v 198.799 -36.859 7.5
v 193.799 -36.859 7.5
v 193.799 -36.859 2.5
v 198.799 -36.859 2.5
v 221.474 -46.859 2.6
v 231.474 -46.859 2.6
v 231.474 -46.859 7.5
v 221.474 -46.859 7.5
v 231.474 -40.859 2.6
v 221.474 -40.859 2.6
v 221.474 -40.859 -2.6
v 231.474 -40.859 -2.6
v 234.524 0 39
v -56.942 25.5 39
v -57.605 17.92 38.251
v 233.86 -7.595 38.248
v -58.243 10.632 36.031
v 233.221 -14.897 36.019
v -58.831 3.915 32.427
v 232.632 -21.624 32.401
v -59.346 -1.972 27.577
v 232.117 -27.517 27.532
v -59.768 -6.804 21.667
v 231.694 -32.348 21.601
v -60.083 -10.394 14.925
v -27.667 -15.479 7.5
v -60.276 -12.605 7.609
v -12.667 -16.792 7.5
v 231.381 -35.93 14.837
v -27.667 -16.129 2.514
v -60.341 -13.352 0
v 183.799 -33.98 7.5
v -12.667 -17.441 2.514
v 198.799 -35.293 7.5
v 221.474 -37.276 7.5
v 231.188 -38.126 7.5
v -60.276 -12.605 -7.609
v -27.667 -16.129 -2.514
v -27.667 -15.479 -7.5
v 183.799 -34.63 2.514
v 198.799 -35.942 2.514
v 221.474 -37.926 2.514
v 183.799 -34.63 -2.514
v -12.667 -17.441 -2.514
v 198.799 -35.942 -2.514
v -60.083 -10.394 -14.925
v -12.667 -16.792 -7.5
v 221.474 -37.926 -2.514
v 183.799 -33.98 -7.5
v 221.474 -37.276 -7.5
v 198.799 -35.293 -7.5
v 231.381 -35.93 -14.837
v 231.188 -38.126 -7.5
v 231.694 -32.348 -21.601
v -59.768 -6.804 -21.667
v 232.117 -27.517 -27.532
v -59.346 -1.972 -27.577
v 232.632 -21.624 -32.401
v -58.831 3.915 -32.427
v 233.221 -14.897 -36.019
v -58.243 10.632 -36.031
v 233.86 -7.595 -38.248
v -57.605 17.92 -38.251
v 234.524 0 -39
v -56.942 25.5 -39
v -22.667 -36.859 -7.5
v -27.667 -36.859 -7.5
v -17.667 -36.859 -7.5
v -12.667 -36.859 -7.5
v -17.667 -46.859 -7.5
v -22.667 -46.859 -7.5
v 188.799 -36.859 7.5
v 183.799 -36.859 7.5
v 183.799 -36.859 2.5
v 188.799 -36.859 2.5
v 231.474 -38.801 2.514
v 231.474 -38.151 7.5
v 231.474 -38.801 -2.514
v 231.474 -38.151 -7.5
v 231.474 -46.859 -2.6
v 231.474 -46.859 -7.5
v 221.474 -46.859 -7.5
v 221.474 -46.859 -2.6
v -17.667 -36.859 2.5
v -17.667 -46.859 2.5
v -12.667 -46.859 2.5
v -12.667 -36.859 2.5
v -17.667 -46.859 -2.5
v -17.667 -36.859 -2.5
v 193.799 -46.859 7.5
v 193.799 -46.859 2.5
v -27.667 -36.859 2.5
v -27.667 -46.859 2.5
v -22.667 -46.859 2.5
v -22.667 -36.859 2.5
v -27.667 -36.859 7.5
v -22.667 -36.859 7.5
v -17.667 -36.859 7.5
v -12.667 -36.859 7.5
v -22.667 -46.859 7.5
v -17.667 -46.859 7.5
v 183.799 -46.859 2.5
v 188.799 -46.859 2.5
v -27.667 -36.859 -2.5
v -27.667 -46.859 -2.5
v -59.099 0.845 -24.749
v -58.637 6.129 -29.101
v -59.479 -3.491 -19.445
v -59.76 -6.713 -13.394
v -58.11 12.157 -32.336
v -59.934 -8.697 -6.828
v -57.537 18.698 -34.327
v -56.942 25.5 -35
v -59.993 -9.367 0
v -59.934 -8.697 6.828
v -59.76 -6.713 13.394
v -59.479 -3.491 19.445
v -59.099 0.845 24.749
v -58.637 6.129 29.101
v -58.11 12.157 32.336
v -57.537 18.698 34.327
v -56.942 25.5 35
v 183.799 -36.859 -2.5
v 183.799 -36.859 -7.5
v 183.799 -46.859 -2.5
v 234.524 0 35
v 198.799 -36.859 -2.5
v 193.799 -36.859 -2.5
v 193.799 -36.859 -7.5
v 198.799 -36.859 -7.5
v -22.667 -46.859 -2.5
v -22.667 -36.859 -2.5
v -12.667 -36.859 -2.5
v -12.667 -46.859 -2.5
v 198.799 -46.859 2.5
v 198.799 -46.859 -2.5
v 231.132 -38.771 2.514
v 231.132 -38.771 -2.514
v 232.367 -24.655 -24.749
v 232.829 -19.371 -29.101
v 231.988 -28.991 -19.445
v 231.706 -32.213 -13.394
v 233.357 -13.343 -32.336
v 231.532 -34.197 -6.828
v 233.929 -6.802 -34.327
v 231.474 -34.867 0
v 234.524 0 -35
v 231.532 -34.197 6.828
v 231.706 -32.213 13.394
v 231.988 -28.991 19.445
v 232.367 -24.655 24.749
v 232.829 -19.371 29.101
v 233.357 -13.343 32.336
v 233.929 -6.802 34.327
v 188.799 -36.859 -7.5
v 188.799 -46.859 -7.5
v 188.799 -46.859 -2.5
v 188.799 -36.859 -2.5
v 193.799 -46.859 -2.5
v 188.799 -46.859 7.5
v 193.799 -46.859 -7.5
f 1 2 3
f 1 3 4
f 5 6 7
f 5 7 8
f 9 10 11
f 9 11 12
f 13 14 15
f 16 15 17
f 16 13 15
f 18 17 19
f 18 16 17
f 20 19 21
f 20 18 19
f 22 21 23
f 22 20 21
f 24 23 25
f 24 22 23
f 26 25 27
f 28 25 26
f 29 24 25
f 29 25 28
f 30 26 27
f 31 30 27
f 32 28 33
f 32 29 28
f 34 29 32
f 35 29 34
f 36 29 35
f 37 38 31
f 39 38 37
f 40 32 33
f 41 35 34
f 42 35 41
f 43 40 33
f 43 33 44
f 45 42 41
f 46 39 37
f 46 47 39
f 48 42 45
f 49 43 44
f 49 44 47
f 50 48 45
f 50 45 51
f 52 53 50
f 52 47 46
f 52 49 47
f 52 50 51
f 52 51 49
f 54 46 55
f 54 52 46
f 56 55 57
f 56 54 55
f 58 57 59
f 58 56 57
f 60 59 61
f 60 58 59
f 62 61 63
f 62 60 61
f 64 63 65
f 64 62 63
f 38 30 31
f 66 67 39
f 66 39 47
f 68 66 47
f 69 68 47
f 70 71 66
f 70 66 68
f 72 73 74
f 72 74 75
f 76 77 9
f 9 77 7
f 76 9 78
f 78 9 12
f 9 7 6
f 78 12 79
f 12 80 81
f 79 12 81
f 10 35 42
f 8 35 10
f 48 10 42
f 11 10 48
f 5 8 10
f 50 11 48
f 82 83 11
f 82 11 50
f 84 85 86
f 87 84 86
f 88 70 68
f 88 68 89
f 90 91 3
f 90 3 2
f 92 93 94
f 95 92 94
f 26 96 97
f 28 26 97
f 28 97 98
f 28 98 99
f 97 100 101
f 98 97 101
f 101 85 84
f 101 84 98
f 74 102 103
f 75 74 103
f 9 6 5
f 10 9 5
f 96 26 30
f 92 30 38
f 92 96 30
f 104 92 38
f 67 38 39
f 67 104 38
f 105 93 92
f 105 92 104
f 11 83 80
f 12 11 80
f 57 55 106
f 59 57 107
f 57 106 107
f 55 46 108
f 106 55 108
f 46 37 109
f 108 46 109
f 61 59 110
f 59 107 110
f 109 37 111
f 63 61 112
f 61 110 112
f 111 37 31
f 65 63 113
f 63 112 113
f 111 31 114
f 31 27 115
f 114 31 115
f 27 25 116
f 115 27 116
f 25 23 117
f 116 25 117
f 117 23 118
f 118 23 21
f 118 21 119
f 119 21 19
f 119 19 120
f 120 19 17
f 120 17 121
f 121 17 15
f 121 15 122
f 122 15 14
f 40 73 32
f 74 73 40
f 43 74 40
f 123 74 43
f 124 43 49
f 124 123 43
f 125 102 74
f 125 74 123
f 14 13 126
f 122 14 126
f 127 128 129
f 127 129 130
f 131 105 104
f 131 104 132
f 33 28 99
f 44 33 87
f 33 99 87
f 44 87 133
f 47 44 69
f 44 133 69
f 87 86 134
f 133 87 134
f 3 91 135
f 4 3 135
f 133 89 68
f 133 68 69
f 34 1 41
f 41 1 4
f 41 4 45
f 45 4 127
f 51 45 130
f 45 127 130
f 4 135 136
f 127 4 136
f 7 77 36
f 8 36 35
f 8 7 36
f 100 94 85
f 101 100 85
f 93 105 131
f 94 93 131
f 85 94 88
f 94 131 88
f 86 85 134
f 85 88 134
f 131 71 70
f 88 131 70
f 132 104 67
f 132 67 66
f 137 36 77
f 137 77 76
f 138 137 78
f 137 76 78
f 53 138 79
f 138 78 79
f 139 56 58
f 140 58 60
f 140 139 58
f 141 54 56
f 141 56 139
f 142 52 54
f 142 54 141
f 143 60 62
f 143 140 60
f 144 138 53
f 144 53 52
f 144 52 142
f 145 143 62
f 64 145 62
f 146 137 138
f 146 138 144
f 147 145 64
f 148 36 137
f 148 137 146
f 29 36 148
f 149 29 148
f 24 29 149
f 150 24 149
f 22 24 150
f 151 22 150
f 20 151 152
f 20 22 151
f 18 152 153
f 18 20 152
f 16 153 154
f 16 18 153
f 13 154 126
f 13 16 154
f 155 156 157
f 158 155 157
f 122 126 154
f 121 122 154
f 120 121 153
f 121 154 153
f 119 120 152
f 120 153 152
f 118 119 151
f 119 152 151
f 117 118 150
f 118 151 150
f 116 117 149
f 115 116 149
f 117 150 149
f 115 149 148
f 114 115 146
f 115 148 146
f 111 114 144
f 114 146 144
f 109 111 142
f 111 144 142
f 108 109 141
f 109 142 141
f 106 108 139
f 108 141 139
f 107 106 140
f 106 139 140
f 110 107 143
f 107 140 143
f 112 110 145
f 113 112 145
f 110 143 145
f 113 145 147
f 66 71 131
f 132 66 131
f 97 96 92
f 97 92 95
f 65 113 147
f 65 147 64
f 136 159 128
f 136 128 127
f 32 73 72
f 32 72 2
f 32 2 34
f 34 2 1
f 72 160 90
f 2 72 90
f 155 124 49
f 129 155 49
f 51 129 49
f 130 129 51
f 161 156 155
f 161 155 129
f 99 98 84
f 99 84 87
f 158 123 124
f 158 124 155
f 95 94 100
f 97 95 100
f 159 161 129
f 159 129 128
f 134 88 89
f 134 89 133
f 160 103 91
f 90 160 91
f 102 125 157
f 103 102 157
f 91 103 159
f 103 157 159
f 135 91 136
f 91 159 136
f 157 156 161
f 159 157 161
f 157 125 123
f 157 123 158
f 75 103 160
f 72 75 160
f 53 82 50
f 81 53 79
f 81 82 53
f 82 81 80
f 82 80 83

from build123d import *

# Parameters (mm, degrees)
SWEEP2_PROFILE_R         = 39
CUT_EXTRUDE5_DEPTH       = 400
BOSS_EXTRUDE2_REACH      = 250.512
BOSS_EXTRUDE2_END_RADIUS = 39
SKETCH30_W               = 15
SKETCH30_H               = 15
SKETCH31_W               = 5
SKETCH31_H               = 5
CUT_EXTRUDE6_DEPTH       = 10
BOSS_EXTRUDE3_REACH      = 250.512
BOSS_EXTRUDE3_END_RADIUS = 39
CUT_EXTRUDE7_DEPTH       = 6


with BuildPart() as part:
    # Sweep2: sweep along a path in Sketch17
    with BuildLine(Plane.XY) as sweep2_path:
        Line((-56.942235333, 25.5), (234.524098388, 0))
    # Sweep2 profile (on start of the path) → Sweep2 (sweep)
    with BuildSketch(Plane(origin=(-56.942235333, 25.5, 0), x_dir=(0.08715574274765121, 0.9961946980917462, 0), z_dir=(0.9961946980917462, -0.08715574274765121, 0))):
        Circle(SWEEP2_PROFILE_R)
    sweep(path=sweep2_path.line)

    # Sketch25 → Cut-Extrude5 (cut)
    with BuildSketch(Plane(origin=(232.742624374, -20.362341152, 0), x_dir=(0, 0, -1), z_dir=(0.9961946980917462, -0.08715574274765125, 0))):
        with BuildLine():
            Line((40.377384308, 20.440121987), (40.377384308, 67.184416815))
            Line((40.377384308, 67.184416815), (-52.333834244, 67.184416815))
            Line((-52.333834244, 67.184416815), (-52.333834244, 20.440121987))
            Line((-52.333834244, 20.440121987), (-35, 20.440121987))
            ThreePointArc((-35, 20.440121987), (0, -14.559878013), (35, 20.440121987))
            Line((35, 20.440121987), (40.377384308, 20.440121987))
        make_face()
    extrude(amount=-CUT_EXTRUDE5_DEPTH, mode=Mode.SUBTRACT)

    # Boss-Extrude2: up to this cylinder (the profile starts outside it)
    boss_extrude2_end = Plane(origin=(90.766179518, 12.577188193, 0), z_dir=(0.9961946980917462, -0.08715574274765124, 0)) * Cylinder(BOSS_EXTRUDE2_END_RADIUS, 790.685640756, mode=Mode.PRIVATE)
    # Sketch30 → Boss-Extrude2 (add, up to the surface)
    with BuildSketch(Plane(origin=(0, -46.859203829, 0), x_dir=(1, 0, 0), z_dir=(0, 1, 0)), mode=Mode.PRIVATE) as boss_extrude2_sk1:
        with Locations((-20.166997814, 0)):
            Rectangle(SKETCH30_W, SKETCH30_H)
    boss_extrude2_tool1 = extrude(boss_extrude2_sk1.sketch, amount=BOSS_EXTRUDE2_REACH, mode=Mode.PRIVATE) - boss_extrude2_end
    add(boss_extrude2_tool1.solids().sort_by_distance((-20.166998, -46.859204, 0))[0])
    # Sketch30 → Boss-Extrude2 (add, up to the surface)
    with BuildSketch(Plane(origin=(0, -46.859203829, 0), x_dir=(1, 0, 0), z_dir=(0, 1, 0)), mode=Mode.PRIVATE) as boss_extrude2_sk2:
        with Locations((191.299335906, 0)):
            Rectangle(SKETCH30_W, SKETCH30_H)
    boss_extrude2_tool2 = extrude(boss_extrude2_sk2.sketch, amount=BOSS_EXTRUDE2_REACH, mode=Mode.PRIVATE) - boss_extrude2_end
    add(boss_extrude2_tool2.solids().sort_by_distance((191.299336, -46.859204, 0))[0])

    # Sketch31 → Cut-Extrude6 (cut)
    with BuildSketch(Plane.XZ.offset(46.859203829)):
        with Locations((-25.166997814, 5)):
            Rectangle(SKETCH31_W, SKETCH31_H)
        with Locations((-15.166997814, 5)):
            Rectangle(SKETCH31_W, SKETCH31_H)
        with Locations((-15.166997814, -5)):
            Rectangle(SKETCH31_W, SKETCH31_H)
        with Locations((-25.166997814, -5)):
            Rectangle(SKETCH31_W, SKETCH31_H)
        with Locations((186.299335906, -5)):
            Rectangle(SKETCH31_W, SKETCH31_H)
        with Locations((196.299335906, -5)):
            Rectangle(SKETCH31_W, SKETCH31_H)
        with Locations((196.299335906, 5)):
            Rectangle(SKETCH31_W, SKETCH31_H)
        with Locations((186.299335906, 5)):
            Rectangle(SKETCH31_W, SKETCH31_H)
    extrude(amount=-CUT_EXTRUDE6_DEPTH, mode=Mode.SUBTRACT)

    # Boss-Extrude3: up to this cylinder (the profile starts outside it)
    boss_extrude3_end = Plane(origin=(230.603306914, 0.343024806, 0), z_dir=(0.9961946980917462, -0.08715574274765124, 0)) * Cylinder(BOSS_EXTRUDE3_END_RADIUS, 580.024, mode=Mode.PRIVATE)
    # Sketch38 → Boss-Extrude3 (add, up to the surface)
    with BuildSketch(Plane(origin=(0, -46.859203829, 0), x_dir=(1, 0, 0), z_dir=(0, 1, 0)), mode=Mode.PRIVATE) as boss_extrude3_sk1:
        Polygon((231.473647391, 0), (231.473647391, -7.5), (221.473647391, -7.5), (221.473647391, 7.5), (231.473647391, 7.5), align=None)
    boss_extrude3_tool1 = extrude(boss_extrude3_sk1.sketch, amount=BOSS_EXTRUDE3_REACH, mode=Mode.PRIVATE) - boss_extrude3_end
    add(boss_extrude3_tool1.solids().sort_by_distance((226.473647, -46.859204, 0))[0])

    # Sketch39 → Cut-Extrude7 (cut)
    with BuildSketch(Plane.XZ.offset(46.859203829)):
        Polygon((231.473647391, 0), (231.473647391, 2.6), (221.473647391, 2.6), (221.473647391, -2.6), (231.473647391, -2.6), align=None)
    extrude(amount=-CUT_EXTRUDE7_DEPTH, mode=Mode.SUBTRACT)


solid = part.part
